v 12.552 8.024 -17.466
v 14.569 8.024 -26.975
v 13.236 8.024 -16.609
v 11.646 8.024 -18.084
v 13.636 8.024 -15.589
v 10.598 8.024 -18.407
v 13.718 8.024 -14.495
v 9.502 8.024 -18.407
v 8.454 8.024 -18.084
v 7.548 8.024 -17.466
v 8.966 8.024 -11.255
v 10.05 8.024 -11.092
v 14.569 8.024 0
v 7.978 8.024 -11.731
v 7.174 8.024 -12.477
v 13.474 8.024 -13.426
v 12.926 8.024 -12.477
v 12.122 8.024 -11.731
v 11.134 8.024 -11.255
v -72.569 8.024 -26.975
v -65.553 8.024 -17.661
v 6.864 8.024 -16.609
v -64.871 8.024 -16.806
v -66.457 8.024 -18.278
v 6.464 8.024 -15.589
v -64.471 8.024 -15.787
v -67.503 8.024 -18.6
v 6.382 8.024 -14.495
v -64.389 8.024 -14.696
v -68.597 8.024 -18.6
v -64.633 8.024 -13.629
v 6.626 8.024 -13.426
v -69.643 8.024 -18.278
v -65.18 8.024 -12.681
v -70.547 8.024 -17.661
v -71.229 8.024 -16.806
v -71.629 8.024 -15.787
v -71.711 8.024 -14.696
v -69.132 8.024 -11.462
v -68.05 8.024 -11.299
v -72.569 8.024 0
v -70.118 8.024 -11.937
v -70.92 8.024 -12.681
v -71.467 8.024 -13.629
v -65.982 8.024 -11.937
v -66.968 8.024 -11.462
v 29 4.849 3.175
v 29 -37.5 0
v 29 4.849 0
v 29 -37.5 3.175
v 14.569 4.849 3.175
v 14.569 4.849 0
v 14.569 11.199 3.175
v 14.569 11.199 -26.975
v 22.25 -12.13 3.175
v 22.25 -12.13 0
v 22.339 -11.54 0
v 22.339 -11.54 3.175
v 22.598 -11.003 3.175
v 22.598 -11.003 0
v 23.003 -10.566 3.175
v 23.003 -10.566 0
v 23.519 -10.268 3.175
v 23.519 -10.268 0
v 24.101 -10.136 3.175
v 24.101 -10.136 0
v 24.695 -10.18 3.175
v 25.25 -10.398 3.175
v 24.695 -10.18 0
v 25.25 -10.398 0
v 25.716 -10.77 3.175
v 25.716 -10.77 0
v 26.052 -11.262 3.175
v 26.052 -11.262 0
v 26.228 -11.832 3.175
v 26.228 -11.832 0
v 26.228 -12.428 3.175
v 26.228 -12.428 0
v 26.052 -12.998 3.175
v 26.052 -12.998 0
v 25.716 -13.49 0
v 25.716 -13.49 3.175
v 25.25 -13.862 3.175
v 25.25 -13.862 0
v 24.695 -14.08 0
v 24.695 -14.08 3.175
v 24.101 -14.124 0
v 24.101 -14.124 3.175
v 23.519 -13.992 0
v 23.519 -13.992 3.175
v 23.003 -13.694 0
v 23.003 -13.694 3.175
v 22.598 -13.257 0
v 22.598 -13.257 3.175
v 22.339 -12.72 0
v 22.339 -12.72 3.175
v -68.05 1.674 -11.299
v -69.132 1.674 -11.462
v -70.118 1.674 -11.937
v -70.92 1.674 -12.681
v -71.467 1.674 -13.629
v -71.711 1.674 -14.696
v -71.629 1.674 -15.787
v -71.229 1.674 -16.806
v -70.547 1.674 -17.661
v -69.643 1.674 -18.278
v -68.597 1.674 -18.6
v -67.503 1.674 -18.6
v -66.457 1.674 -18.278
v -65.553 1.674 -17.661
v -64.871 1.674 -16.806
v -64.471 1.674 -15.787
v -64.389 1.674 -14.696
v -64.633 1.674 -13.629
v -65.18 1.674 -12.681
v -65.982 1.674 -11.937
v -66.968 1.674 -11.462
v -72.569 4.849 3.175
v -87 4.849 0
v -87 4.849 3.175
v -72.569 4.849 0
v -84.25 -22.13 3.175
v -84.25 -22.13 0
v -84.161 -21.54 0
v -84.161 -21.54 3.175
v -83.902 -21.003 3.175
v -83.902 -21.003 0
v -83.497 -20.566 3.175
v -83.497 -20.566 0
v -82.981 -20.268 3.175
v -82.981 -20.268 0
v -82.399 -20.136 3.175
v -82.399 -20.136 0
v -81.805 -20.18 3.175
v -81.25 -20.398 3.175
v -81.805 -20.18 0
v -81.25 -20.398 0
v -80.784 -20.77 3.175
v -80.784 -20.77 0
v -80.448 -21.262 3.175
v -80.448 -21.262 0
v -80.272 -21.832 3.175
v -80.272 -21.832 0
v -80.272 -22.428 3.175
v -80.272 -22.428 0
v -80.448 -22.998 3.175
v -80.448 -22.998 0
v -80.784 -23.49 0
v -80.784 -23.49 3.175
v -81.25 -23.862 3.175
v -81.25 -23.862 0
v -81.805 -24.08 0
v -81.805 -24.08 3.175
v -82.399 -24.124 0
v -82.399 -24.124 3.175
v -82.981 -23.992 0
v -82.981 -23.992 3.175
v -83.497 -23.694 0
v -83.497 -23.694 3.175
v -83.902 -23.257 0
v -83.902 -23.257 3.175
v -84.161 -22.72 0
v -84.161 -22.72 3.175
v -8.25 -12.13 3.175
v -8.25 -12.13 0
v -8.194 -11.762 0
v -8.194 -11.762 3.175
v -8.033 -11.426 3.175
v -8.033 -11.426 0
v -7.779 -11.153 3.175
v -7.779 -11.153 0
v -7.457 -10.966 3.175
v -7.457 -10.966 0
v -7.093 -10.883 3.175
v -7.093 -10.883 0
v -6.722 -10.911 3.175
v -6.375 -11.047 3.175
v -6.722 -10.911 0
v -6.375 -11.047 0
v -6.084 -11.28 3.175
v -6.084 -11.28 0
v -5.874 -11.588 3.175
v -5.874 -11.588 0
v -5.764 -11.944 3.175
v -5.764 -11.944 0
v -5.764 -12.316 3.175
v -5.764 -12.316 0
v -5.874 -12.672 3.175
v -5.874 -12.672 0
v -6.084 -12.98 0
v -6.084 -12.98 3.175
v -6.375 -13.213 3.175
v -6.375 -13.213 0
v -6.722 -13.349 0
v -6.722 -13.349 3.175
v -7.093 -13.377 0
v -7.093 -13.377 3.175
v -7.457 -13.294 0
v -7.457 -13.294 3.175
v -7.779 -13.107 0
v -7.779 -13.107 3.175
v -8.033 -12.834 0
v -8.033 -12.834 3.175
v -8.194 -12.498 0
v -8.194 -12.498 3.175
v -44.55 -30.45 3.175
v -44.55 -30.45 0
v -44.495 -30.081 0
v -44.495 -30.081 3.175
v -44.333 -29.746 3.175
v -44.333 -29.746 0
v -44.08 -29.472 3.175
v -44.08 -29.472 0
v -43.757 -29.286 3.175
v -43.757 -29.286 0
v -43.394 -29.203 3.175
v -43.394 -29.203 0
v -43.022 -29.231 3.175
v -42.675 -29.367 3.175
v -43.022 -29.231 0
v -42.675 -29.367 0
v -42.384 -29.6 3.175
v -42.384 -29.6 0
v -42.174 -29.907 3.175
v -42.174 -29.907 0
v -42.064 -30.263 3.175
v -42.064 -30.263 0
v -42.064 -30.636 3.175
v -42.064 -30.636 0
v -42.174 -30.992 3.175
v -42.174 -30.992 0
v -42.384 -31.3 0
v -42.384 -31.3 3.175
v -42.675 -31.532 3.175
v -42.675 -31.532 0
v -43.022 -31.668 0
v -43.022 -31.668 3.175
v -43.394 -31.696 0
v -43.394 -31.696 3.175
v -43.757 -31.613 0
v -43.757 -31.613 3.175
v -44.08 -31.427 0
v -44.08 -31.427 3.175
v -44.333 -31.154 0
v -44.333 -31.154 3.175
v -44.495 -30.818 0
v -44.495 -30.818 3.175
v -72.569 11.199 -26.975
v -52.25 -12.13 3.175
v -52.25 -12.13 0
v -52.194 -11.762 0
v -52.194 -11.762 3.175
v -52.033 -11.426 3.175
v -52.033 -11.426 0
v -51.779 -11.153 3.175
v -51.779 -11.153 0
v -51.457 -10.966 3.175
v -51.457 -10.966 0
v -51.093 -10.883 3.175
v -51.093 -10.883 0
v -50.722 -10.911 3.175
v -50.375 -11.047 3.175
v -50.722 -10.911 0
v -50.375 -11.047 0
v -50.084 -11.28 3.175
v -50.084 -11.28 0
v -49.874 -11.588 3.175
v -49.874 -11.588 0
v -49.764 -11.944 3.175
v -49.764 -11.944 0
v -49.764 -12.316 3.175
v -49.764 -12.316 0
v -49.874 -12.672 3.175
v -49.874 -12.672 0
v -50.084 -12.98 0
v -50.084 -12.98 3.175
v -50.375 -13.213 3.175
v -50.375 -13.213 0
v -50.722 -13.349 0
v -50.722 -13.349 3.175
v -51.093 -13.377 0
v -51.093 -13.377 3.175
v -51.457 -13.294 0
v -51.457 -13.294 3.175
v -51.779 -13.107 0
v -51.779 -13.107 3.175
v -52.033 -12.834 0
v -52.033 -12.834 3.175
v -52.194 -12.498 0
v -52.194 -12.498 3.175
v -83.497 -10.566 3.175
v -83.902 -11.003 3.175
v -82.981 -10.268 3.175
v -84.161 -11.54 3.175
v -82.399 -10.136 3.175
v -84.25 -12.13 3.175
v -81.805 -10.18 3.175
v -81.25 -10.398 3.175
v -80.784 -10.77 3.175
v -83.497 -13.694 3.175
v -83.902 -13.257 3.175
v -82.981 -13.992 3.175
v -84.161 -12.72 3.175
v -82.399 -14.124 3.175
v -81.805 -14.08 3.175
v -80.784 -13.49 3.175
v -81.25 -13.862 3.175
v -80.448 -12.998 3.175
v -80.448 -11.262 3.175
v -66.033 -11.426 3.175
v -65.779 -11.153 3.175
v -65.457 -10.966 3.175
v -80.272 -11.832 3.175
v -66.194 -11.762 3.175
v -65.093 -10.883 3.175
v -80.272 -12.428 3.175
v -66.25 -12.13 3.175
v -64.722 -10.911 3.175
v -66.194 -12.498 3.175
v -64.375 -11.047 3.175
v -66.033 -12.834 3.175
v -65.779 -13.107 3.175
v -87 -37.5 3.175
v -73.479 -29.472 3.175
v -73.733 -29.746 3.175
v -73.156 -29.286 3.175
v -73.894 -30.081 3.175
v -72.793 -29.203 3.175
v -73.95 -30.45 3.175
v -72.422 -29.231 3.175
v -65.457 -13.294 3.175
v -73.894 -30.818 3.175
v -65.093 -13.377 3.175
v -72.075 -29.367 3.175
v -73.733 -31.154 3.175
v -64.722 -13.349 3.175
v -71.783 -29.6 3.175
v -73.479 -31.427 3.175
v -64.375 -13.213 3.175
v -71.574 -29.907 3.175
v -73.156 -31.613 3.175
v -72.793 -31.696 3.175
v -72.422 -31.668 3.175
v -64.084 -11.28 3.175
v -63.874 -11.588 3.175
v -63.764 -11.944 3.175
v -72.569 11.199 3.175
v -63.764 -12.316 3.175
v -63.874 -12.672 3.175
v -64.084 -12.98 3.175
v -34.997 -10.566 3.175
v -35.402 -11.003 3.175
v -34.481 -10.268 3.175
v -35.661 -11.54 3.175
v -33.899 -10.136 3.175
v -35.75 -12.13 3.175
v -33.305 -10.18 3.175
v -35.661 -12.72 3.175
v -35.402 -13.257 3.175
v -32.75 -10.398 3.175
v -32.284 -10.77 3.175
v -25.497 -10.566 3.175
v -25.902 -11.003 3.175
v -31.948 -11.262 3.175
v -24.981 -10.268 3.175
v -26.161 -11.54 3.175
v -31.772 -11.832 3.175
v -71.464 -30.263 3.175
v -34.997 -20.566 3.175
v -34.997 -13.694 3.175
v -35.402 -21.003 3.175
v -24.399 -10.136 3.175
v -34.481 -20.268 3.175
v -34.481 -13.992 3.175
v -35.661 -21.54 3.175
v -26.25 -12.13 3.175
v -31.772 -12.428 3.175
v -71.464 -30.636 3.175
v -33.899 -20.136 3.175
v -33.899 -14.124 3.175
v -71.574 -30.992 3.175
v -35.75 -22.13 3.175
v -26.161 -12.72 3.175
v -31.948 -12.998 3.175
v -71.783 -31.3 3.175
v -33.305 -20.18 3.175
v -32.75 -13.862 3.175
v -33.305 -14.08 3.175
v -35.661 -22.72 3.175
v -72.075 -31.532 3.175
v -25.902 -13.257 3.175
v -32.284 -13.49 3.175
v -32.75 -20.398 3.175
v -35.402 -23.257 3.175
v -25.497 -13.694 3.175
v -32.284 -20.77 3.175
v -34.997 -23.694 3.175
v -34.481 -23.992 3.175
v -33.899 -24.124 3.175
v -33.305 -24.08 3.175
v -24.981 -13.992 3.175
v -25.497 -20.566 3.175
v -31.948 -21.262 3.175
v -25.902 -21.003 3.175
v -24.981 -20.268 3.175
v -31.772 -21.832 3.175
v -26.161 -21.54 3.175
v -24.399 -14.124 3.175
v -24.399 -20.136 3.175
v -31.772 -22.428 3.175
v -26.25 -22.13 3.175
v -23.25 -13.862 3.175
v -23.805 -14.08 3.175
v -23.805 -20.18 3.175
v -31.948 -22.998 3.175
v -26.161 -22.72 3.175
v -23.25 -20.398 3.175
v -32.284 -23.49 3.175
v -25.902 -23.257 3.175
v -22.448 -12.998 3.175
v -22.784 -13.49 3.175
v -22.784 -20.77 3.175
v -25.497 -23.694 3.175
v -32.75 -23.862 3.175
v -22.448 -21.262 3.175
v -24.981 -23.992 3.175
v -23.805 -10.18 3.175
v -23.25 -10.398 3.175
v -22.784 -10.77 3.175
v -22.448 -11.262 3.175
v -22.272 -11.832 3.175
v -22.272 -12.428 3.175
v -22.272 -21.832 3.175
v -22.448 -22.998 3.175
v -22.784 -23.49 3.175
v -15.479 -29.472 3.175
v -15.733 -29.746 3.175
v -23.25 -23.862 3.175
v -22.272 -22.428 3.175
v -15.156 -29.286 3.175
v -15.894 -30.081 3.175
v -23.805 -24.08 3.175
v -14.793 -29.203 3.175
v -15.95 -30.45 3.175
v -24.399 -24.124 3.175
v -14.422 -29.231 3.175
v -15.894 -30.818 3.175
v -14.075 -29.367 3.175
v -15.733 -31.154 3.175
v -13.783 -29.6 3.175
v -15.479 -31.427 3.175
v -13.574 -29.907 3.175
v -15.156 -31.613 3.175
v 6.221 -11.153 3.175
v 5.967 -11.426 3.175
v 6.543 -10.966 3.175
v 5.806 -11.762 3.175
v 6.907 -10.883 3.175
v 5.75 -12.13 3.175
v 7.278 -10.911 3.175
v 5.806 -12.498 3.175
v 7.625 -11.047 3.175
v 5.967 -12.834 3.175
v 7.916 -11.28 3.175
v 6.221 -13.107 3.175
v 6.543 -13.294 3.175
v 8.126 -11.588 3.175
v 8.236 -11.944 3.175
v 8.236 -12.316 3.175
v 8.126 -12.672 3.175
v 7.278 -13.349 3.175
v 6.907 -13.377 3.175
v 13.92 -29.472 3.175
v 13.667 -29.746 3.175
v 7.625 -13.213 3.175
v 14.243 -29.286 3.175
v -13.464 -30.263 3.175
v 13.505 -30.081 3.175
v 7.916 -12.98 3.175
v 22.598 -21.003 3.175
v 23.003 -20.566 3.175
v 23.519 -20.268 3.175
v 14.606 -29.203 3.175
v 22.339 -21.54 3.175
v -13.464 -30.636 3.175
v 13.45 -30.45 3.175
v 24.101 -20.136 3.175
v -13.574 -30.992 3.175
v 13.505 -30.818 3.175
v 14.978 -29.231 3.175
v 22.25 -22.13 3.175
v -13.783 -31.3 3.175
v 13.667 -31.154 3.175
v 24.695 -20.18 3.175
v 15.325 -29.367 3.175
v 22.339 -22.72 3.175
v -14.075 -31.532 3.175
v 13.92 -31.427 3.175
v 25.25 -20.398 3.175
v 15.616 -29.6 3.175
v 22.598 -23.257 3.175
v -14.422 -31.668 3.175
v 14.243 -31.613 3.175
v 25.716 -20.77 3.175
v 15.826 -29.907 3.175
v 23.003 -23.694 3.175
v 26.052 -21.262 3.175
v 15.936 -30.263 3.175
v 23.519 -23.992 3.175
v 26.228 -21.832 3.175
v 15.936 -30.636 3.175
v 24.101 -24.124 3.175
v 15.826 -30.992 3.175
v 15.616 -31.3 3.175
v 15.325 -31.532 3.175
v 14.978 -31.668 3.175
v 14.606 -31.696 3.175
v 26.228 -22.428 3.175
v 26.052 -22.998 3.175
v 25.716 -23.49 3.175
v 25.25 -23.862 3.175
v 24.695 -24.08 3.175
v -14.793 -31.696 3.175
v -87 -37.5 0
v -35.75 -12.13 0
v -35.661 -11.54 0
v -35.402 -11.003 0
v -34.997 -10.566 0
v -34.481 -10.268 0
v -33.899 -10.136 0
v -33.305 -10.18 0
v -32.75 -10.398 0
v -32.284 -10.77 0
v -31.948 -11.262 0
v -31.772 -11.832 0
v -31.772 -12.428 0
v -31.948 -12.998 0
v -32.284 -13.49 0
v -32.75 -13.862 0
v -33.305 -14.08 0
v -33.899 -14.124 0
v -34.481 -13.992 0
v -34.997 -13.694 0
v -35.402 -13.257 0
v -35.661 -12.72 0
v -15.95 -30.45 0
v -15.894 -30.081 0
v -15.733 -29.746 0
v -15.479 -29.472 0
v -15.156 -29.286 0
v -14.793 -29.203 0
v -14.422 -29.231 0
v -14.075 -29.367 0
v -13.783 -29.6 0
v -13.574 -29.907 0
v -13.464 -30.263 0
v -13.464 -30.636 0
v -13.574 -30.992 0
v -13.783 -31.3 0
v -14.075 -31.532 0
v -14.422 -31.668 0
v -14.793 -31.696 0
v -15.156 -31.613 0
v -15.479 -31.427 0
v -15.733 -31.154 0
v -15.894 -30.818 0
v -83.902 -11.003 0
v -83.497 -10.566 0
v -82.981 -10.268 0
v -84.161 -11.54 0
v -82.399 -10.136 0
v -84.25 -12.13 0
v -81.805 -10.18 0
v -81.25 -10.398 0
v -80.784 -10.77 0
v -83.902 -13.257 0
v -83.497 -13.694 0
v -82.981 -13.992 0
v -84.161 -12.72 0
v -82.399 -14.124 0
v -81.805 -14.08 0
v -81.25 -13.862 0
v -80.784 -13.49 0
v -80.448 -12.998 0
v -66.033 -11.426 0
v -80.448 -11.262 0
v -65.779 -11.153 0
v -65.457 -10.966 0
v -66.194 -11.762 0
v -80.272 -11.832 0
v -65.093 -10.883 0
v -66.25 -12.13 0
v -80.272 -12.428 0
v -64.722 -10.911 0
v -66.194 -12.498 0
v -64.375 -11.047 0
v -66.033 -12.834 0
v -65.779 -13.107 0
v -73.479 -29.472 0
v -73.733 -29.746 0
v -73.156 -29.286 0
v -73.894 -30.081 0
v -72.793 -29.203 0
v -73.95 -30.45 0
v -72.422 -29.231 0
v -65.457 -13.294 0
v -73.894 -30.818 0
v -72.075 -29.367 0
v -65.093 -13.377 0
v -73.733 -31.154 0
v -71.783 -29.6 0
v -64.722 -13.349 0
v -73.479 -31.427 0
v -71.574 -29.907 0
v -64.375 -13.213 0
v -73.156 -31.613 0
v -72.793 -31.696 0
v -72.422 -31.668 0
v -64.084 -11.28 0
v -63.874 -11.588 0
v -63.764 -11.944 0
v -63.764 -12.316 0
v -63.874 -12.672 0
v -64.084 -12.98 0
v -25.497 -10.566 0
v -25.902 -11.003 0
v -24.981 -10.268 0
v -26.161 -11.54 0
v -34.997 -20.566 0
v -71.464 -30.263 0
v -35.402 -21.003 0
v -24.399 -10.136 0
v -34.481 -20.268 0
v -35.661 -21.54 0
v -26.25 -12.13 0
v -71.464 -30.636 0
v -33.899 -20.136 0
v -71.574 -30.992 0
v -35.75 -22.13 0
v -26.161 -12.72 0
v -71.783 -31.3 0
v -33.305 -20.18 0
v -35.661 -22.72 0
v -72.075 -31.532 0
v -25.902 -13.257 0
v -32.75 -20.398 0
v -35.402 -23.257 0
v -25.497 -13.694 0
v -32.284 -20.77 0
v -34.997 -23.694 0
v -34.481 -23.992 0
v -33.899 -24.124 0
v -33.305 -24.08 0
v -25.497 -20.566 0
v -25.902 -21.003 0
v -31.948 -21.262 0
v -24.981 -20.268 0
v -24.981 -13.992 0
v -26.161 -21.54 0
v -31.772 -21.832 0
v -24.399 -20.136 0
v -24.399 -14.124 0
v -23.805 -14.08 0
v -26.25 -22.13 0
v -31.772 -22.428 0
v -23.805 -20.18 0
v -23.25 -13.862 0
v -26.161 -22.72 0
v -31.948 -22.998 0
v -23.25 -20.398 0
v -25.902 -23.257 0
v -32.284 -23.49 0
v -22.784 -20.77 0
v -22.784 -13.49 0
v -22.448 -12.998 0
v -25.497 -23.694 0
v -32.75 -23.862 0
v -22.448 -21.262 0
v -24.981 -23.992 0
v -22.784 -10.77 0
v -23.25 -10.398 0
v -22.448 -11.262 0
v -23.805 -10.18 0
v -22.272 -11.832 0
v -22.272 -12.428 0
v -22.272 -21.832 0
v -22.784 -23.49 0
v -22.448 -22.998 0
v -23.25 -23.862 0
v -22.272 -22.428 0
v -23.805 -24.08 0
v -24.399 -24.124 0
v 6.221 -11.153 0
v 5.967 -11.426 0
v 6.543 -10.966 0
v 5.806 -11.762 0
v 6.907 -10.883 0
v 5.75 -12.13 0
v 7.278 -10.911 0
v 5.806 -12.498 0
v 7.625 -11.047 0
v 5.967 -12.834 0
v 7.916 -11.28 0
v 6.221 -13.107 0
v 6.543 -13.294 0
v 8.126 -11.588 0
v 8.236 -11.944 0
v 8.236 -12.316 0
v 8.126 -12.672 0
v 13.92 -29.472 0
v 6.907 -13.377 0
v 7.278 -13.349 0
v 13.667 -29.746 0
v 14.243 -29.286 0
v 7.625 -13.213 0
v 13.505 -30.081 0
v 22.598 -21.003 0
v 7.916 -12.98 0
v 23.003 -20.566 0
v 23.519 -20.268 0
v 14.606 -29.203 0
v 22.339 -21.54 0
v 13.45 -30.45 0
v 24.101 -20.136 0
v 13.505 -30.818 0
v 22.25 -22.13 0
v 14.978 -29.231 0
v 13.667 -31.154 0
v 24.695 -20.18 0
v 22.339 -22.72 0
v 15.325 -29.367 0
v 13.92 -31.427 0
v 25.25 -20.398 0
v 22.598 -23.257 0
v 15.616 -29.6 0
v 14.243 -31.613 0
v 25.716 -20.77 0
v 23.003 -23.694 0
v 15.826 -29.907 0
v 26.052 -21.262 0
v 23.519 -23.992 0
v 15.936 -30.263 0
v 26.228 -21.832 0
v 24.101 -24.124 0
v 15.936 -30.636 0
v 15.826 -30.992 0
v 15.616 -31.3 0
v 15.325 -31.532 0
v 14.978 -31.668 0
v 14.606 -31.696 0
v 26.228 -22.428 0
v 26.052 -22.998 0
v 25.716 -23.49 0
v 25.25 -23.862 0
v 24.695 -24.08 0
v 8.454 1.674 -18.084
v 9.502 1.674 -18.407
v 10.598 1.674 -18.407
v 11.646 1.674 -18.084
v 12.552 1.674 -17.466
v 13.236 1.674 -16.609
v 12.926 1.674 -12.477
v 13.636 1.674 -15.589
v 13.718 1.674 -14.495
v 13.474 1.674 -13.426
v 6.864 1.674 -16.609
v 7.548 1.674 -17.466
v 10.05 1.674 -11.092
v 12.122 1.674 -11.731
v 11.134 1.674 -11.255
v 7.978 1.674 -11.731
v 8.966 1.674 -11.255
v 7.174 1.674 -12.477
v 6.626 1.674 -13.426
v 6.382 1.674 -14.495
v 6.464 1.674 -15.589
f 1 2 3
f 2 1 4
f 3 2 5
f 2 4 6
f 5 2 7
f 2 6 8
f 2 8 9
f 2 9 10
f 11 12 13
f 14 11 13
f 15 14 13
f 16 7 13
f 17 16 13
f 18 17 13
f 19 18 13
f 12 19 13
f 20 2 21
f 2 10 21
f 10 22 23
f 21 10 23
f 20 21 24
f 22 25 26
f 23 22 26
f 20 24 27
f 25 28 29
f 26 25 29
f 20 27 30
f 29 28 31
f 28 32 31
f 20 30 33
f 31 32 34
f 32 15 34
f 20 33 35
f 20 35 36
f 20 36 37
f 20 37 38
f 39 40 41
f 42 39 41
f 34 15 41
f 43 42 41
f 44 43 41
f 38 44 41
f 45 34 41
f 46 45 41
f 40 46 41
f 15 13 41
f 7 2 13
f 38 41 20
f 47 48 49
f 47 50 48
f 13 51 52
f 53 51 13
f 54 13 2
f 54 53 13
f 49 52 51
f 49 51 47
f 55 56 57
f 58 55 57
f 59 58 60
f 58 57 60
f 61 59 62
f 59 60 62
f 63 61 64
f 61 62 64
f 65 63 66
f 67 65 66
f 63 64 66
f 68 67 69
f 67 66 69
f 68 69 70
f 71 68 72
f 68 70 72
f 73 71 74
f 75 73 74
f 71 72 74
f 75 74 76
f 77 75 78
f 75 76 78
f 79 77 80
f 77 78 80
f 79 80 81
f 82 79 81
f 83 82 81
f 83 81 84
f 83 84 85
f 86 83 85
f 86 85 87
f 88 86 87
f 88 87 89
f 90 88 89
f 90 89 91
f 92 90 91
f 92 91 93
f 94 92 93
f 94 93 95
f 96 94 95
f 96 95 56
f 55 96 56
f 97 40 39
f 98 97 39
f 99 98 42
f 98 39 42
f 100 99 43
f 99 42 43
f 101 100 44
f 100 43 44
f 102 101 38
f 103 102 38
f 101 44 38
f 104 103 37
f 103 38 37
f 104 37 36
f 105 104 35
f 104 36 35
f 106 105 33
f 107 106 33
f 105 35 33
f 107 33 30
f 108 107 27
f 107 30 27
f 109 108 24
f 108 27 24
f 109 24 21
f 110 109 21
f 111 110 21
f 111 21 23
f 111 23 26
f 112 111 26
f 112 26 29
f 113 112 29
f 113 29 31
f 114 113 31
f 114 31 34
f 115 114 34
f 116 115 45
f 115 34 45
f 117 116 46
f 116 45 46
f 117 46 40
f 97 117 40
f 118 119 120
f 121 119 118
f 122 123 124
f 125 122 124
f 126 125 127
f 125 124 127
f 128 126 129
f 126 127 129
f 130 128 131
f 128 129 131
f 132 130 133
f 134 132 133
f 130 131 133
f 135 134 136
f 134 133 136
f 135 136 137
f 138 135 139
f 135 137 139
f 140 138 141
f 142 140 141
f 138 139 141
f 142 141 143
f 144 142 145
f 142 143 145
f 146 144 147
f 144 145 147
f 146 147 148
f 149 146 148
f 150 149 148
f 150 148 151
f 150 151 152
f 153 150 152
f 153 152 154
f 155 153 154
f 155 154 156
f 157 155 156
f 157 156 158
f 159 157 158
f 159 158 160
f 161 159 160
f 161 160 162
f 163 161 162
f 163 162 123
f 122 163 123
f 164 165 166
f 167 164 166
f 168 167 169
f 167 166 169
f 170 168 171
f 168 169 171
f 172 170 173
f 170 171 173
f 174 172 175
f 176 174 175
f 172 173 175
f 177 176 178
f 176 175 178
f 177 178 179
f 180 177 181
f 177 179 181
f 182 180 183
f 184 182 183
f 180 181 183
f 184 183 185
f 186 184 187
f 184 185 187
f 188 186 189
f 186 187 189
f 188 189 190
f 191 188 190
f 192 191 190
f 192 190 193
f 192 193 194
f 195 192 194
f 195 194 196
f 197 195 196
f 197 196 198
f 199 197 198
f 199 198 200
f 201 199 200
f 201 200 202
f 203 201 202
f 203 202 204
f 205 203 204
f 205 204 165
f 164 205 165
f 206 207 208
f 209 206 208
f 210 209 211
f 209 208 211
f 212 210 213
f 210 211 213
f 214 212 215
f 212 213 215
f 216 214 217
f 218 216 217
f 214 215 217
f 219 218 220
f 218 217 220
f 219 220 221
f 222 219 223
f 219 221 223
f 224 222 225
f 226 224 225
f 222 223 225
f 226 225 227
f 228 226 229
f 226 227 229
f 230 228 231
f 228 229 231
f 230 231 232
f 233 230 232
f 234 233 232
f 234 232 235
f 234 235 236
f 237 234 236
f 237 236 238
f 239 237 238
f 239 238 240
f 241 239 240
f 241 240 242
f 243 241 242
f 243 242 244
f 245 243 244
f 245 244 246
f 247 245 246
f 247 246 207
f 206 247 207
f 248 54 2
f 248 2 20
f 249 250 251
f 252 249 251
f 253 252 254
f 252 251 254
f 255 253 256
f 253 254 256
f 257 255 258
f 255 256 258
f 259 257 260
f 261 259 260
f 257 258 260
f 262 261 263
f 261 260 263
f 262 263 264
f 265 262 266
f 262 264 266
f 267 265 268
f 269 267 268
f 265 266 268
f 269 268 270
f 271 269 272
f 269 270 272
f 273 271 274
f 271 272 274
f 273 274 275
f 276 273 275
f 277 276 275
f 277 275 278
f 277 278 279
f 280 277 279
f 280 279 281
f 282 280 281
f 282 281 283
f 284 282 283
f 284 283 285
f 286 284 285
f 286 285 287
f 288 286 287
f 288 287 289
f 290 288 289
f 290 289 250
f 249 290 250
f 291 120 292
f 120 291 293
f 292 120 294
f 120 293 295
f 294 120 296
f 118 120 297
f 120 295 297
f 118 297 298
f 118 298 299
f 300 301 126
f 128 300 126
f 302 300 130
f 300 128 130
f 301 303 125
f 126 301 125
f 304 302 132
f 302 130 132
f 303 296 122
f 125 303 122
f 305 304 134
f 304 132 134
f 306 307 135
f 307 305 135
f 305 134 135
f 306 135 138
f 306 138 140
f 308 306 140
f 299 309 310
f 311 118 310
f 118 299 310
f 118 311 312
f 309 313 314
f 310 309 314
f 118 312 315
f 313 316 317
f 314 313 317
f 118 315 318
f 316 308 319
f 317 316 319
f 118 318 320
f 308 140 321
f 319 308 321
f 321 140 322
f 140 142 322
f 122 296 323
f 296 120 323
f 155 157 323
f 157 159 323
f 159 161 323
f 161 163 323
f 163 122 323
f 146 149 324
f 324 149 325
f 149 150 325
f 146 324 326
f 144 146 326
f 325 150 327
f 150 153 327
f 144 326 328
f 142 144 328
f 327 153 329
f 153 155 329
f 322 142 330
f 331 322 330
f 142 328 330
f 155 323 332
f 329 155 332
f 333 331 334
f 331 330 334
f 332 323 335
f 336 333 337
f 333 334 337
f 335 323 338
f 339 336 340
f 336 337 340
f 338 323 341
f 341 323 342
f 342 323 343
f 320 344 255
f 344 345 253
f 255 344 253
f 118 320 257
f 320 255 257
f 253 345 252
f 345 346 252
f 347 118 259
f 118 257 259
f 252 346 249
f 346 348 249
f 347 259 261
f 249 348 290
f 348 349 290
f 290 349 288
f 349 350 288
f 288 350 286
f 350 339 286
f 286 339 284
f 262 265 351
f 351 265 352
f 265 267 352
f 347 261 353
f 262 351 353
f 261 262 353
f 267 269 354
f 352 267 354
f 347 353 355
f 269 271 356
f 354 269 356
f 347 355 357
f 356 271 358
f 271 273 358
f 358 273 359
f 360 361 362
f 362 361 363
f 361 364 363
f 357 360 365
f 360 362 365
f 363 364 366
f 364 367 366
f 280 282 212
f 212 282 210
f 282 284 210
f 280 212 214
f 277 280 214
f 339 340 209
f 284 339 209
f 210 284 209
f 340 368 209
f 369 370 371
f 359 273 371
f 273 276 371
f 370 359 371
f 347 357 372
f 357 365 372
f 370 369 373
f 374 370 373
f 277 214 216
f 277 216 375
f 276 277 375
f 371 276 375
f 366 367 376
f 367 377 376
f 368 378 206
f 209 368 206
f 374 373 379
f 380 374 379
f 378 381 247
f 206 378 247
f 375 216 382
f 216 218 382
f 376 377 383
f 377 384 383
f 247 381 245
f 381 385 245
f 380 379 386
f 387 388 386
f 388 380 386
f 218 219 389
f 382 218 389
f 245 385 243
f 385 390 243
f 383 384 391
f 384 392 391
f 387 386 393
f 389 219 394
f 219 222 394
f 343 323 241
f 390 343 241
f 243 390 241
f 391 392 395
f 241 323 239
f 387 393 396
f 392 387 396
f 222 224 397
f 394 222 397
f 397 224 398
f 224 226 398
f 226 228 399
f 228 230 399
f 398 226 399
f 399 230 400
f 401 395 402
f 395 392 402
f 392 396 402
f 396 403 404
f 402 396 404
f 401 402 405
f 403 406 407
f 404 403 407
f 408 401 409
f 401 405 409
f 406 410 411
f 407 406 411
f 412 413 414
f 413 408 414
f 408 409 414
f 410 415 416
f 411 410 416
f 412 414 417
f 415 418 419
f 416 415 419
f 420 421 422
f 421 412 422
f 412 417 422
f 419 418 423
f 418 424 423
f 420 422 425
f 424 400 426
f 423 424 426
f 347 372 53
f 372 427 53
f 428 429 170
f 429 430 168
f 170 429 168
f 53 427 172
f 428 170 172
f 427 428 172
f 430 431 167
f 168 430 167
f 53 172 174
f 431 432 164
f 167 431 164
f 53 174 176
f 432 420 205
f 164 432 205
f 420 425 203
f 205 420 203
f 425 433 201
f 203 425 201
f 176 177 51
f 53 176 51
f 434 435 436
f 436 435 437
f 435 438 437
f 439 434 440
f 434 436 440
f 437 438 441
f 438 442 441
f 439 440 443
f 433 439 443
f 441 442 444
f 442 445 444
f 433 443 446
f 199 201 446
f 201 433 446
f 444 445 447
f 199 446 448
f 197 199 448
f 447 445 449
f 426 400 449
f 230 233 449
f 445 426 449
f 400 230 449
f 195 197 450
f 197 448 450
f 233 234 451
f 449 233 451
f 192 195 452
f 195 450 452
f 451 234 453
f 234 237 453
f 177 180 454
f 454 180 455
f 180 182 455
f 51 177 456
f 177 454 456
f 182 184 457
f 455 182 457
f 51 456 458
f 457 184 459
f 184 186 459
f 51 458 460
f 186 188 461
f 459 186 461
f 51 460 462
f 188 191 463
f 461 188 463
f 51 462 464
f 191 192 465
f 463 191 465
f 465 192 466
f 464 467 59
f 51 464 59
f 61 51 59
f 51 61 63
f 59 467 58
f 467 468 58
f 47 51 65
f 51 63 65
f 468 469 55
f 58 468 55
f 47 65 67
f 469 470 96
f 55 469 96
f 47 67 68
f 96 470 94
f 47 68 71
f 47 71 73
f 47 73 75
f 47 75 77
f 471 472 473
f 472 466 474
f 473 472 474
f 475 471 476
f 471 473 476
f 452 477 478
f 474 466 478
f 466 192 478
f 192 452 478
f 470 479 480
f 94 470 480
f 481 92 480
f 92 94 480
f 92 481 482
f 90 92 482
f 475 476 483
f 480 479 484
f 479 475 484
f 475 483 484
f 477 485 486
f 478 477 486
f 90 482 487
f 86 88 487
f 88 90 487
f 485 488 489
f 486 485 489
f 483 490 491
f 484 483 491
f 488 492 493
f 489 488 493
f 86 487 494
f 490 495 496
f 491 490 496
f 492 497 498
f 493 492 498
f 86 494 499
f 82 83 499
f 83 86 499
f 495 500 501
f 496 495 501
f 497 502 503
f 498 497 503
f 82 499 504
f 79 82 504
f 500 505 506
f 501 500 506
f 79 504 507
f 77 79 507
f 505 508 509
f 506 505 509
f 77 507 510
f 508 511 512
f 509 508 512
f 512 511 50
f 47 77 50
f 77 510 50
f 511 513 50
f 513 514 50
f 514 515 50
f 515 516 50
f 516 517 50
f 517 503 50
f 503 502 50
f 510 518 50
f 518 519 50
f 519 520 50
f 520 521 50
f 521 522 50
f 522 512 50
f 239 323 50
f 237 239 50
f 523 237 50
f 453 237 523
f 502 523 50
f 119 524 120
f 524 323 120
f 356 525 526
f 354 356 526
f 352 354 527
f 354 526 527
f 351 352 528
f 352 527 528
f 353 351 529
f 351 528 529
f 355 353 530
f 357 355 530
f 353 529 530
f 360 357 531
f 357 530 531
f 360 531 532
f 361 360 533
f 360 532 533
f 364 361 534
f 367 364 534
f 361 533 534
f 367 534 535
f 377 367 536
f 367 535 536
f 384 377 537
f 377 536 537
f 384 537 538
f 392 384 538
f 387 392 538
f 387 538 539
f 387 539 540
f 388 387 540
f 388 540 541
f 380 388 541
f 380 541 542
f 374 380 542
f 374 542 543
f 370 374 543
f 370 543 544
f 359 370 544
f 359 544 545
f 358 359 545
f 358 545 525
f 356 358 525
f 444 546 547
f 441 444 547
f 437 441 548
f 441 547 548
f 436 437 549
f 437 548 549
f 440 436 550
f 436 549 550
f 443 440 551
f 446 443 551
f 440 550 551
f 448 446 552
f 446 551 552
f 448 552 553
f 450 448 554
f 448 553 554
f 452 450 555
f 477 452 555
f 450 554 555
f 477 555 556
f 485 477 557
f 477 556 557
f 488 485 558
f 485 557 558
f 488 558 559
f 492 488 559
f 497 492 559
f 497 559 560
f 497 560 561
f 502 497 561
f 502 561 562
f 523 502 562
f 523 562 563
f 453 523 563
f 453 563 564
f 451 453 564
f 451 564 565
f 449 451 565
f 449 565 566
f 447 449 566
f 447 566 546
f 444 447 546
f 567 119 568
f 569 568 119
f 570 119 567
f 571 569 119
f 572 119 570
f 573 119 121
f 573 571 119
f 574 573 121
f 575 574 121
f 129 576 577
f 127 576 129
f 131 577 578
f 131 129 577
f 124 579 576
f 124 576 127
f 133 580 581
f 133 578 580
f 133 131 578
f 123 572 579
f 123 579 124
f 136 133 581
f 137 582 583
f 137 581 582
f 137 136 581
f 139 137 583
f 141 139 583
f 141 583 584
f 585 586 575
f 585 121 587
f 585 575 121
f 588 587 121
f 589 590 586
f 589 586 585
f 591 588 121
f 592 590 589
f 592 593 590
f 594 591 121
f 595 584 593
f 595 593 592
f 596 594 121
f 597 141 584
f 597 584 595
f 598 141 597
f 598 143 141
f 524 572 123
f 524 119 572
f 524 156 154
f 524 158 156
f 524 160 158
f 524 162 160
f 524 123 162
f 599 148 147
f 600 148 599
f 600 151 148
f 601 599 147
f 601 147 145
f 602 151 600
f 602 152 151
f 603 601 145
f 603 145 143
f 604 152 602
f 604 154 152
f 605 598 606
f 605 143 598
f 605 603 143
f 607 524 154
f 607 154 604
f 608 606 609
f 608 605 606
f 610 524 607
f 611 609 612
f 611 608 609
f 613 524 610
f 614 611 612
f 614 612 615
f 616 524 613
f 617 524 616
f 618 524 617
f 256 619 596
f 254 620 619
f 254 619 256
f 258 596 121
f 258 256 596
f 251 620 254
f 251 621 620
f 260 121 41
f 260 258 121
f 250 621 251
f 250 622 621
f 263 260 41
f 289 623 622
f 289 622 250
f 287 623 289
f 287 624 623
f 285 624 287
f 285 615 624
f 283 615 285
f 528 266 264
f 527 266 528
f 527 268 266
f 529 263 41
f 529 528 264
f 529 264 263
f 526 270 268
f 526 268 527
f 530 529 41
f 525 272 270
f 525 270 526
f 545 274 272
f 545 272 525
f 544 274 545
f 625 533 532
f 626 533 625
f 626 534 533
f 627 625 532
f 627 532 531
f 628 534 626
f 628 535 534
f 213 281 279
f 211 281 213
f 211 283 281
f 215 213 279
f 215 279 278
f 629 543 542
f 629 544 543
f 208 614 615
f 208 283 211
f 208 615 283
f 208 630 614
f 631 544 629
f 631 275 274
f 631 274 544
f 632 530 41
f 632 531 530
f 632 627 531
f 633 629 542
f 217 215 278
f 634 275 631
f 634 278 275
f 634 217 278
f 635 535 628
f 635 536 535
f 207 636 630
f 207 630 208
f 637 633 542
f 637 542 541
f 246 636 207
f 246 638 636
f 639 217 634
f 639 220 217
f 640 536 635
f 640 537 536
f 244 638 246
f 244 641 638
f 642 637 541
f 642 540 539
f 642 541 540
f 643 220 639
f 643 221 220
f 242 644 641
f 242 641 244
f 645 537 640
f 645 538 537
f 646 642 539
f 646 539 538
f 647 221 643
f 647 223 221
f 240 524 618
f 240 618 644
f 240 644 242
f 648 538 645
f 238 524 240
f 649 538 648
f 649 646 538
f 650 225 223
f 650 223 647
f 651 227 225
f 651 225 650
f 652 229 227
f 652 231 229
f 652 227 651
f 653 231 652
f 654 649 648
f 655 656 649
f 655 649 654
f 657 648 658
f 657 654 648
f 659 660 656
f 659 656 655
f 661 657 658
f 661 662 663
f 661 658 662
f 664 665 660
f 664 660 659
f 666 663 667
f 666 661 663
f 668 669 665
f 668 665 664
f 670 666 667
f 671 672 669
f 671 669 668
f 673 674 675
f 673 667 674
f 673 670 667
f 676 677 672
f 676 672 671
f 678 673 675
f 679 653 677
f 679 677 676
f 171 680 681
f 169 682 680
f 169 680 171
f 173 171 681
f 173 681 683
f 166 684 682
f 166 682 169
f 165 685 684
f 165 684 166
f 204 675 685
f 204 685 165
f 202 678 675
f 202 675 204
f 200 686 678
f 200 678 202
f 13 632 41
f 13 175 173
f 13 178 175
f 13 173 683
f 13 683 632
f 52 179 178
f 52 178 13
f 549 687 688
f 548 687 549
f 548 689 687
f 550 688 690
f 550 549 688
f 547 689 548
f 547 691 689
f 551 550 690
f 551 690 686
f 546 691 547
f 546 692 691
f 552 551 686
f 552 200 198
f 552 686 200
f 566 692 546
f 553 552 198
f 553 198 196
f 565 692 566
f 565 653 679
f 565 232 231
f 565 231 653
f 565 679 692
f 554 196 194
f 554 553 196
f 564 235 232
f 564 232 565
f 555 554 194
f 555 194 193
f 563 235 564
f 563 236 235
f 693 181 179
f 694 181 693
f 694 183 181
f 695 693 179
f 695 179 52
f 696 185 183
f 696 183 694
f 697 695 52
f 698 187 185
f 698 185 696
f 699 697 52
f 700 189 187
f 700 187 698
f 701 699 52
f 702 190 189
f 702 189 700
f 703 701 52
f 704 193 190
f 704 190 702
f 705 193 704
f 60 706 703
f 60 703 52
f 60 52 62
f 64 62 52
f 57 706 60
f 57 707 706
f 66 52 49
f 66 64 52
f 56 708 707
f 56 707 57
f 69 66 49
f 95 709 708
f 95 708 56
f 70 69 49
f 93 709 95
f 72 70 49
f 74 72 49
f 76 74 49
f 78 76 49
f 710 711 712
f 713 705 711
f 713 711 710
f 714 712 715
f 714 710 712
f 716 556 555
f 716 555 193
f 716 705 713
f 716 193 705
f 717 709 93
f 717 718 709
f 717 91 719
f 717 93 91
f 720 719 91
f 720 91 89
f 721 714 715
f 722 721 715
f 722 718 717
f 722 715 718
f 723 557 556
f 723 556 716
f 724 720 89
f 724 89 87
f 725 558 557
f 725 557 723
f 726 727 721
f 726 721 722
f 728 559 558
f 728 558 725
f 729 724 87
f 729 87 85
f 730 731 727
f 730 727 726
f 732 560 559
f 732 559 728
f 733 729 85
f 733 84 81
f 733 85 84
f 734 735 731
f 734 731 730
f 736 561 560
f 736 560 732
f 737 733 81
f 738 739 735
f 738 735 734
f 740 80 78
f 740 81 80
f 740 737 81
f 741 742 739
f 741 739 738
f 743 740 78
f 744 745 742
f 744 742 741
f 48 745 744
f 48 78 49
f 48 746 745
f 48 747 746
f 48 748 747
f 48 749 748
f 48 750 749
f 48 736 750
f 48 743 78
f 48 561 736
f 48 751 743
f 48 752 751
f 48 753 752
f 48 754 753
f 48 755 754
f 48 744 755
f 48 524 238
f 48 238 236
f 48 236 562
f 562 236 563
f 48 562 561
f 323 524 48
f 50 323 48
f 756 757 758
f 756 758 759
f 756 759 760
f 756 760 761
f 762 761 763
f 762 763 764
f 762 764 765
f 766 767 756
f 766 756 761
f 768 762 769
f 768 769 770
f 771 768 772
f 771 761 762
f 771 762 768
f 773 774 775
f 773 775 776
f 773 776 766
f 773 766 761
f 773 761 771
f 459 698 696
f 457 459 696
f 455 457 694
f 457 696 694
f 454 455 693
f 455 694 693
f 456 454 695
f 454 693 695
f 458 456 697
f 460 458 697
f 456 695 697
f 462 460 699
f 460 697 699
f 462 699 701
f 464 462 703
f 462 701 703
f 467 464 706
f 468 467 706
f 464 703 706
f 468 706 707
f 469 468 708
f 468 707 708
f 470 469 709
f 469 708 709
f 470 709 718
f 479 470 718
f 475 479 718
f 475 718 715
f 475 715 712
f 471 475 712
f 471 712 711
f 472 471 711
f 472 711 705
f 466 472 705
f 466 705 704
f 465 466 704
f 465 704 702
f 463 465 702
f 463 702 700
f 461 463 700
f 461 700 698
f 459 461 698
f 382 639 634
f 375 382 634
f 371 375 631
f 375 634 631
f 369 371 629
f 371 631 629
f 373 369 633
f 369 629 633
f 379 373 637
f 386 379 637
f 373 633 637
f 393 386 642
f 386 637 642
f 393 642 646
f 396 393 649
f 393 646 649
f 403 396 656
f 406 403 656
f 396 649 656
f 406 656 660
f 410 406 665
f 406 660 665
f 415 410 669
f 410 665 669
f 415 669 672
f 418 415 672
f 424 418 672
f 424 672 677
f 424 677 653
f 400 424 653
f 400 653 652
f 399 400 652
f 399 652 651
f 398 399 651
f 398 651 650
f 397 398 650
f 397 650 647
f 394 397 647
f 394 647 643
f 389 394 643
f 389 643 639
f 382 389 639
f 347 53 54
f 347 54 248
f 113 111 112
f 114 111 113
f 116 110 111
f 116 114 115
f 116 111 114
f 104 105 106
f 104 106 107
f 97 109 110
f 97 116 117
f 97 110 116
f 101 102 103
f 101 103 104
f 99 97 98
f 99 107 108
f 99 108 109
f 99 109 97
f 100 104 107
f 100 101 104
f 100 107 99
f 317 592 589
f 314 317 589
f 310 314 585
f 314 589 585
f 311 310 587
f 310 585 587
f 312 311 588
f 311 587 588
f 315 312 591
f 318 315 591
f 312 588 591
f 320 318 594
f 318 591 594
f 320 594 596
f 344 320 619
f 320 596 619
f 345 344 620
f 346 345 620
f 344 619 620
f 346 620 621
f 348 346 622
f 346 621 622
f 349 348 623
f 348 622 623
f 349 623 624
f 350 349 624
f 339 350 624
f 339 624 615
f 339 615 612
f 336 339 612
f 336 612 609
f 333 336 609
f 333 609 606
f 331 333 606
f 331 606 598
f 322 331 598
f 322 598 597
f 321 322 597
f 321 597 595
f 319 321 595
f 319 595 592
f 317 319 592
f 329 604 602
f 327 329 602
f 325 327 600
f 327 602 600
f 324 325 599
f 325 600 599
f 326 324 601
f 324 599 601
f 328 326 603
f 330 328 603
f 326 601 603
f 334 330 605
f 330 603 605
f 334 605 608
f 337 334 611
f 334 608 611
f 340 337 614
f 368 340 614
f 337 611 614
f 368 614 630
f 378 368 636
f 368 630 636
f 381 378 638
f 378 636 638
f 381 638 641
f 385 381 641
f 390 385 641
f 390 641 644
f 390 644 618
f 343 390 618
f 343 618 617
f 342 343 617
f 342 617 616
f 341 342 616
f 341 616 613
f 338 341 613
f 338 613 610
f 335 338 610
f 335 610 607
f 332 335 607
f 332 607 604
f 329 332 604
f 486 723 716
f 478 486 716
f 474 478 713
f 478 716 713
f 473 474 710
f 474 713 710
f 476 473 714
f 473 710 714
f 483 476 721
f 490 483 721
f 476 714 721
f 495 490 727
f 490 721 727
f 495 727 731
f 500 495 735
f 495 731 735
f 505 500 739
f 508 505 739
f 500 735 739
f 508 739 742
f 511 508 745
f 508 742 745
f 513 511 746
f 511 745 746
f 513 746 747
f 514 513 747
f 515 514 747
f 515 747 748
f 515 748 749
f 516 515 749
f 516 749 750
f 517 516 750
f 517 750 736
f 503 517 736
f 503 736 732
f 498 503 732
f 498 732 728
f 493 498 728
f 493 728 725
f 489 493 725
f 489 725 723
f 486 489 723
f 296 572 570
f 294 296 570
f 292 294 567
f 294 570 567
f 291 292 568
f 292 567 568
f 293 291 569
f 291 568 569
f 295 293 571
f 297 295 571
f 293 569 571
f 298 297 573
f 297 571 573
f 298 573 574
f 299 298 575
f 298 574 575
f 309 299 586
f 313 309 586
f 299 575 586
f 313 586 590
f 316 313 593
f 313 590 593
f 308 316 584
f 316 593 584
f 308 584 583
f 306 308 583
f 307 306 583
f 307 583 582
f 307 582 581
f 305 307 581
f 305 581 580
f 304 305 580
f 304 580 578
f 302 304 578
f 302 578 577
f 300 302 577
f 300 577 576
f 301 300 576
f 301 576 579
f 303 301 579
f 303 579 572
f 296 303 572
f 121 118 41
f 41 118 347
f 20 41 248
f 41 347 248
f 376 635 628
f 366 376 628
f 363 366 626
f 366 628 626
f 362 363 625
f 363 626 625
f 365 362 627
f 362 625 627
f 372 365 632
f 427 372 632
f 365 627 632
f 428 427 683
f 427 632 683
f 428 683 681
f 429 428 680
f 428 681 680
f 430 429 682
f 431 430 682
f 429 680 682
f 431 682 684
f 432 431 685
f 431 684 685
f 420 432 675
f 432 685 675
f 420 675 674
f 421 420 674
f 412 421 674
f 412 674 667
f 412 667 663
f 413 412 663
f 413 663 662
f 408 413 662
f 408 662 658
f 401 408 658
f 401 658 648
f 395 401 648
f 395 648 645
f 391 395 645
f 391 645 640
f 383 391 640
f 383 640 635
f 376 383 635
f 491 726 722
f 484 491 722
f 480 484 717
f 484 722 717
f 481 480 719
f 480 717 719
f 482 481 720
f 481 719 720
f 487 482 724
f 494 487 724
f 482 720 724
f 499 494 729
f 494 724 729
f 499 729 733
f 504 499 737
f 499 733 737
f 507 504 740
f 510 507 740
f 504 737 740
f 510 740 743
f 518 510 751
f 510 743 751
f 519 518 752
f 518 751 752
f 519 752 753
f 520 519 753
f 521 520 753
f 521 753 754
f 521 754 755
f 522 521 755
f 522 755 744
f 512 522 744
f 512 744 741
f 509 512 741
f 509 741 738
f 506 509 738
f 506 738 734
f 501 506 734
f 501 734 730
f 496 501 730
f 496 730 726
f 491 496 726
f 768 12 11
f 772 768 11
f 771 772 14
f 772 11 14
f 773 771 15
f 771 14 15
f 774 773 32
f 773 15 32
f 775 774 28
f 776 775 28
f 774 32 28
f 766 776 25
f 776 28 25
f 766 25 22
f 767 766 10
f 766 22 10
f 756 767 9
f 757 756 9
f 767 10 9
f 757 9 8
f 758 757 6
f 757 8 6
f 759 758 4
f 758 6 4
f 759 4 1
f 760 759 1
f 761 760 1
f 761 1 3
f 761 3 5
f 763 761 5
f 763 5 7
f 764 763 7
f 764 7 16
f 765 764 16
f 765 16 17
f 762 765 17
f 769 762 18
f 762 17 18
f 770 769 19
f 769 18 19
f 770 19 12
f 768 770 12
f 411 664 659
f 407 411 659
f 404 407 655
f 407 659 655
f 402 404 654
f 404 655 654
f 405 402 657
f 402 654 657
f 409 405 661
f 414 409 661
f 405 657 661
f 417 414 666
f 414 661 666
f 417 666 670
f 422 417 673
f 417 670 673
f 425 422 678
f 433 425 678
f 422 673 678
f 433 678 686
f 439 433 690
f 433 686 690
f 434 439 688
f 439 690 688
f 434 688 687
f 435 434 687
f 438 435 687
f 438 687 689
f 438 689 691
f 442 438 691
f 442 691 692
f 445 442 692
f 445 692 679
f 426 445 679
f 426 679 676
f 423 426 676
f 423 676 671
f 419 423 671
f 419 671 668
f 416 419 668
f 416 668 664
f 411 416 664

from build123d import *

# Parameters (mm, degrees)
SKETCH1_W           = 116
SKETCH1_H           = 34.5
BOSS_EXTRUDE1_DEPTH = 3.175
SKETCH2_R           = 2
SKETCH2_R_2         = 1.25
CUT_EXTRUDE1_DEPTH  = 95.79098388
SKETCH3_W           = 116
SKETCH3_H           = 3.175
BOSS_EXTRUDE2_DEPTH = 14.1986
SKETCH4_W           = 116
SKETCH4_H           = 3.175
BOSS_EXTRUDE3_DEPTH = 26.9748
SKETCH6_R           = 3.678354521
SKETCH6_R_2         = 3.671158805
BOSS_EXTRUDE4_DEPTH = 6.35
SKETCH7_W           = 14.431210835
SKETCH7_H           = 30.1498
CUT_EXTRUDE2_DEPTH  = 6.35


with BuildPart() as part:
    # Sketch1 → Boss-Extrude1 (new body)
    with BuildSketch(Plane.XY):
        with Locations((-29, -20.25)):
            Rectangle(SKETCH1_W, SKETCH1_H)
    extrude(amount=BOSS_EXTRUDE1_DEPTH)

    # Sketch2 → Cut-Extrude1 (cut, through all)
    with BuildSketch(Plane(origin=(0, 0, 0), x_dir=(-1, 0, 0), z_dir=(0, 0, -1))):
        with Locations((-24.25, -22.13)):
            Circle(SKETCH2_R)
        with Locations((-24.25, -12.13)):
            Circle(SKETCH2_R)
        with Locations((24.25, -12.13)):
            Circle(SKETCH2_R)
        with Locations((24.25, -22.13)):
            Circle(SKETCH2_R)
        with Locations((33.75, -12.13)):
            Circle(SKETCH2_R)
        with Locations((33.75, -22.13)):
            Circle(SKETCH2_R)
        with Locations((82.25, -12.13)):
            Circle(SKETCH2_R)
        with Locations((82.25, -22.13)):
            Circle(SKETCH2_R)
        with Locations((72.699747468, -30.449747468)):
            Circle(SKETCH2_R_2)
        with Locations((65, -12.13)):
            Circle(SKETCH2_R_2)
        with Locations((51, -12.13)):
            Circle(SKETCH2_R_2)
        with Locations((43.300252532, -30.449747468)):
            Circle(SKETCH2_R_2)
        with Locations((14.699747468, -30.449747468)):
            Circle(SKETCH2_R_2)
        with Locations((7, -12.13)):
            Circle(SKETCH2_R_2)
        with Locations((-7, -12.13)):
            Circle(SKETCH2_R_2)
        with Locations((-14.699747468, -30.449747468)):
            Circle(SKETCH2_R_2)
    extrude(amount=-CUT_EXTRUDE1_DEPTH, mode=Mode.SUBTRACT)

    # Sketch3 → Boss-Extrude2 (add)
    with BuildSketch(Plane(origin=(0, -3, 0), x_dir=(1, 0, 0), z_dir=(0, 1, 0))):
        with Locations((-29, -1.5875)):
            Rectangle(SKETCH3_W, SKETCH3_H)
    extrude(amount=BOSS_EXTRUDE2_DEPTH)

    # Sketch4 → Boss-Extrude3 (add)
    with BuildSketch(Plane(origin=(0, 0, 0), x_dir=(-1, 0, 0), z_dir=(0, 0, -1))):
        with Locations((29, 9.6111)):
            Rectangle(SKETCH4_W, SKETCH4_H)
    extrude(amount=BOSS_EXTRUDE3_DEPTH)

    # Sketch6 → Boss-Extrude4 (add)
    with BuildSketch(Plane.XZ.offset(-8.0236)):
        with Locations(Location((10.05, -14.77, 0), (0, 0, 90))):
            Circle(SKETCH6_R)
        with Locations(Location((-68.05, -14.97, 0), (0, 0, 90))):
            Circle(SKETCH6_R_2)
    extrude(amount=BOSS_EXTRUDE4_DEPTH)

    # Sketch7 → Cut-Extrude2 (cut)
    with BuildSketch(Plane(origin=(0, 11.1986, 0), x_dir=(1, 0, 0), z_dir=(0, 1, 0))):
        with Locations((-79.784394582, 11.8999)):
            Rectangle(SKETCH7_W, SKETCH7_H)
        with Locations((21.784394583, 11.8999)):
            Rectangle(SKETCH7_W, SKETCH7_H)
    extrude(amount=-CUT_EXTRUDE2_DEPTH, mode=Mode.SUBTRACT)


solid = part.part
